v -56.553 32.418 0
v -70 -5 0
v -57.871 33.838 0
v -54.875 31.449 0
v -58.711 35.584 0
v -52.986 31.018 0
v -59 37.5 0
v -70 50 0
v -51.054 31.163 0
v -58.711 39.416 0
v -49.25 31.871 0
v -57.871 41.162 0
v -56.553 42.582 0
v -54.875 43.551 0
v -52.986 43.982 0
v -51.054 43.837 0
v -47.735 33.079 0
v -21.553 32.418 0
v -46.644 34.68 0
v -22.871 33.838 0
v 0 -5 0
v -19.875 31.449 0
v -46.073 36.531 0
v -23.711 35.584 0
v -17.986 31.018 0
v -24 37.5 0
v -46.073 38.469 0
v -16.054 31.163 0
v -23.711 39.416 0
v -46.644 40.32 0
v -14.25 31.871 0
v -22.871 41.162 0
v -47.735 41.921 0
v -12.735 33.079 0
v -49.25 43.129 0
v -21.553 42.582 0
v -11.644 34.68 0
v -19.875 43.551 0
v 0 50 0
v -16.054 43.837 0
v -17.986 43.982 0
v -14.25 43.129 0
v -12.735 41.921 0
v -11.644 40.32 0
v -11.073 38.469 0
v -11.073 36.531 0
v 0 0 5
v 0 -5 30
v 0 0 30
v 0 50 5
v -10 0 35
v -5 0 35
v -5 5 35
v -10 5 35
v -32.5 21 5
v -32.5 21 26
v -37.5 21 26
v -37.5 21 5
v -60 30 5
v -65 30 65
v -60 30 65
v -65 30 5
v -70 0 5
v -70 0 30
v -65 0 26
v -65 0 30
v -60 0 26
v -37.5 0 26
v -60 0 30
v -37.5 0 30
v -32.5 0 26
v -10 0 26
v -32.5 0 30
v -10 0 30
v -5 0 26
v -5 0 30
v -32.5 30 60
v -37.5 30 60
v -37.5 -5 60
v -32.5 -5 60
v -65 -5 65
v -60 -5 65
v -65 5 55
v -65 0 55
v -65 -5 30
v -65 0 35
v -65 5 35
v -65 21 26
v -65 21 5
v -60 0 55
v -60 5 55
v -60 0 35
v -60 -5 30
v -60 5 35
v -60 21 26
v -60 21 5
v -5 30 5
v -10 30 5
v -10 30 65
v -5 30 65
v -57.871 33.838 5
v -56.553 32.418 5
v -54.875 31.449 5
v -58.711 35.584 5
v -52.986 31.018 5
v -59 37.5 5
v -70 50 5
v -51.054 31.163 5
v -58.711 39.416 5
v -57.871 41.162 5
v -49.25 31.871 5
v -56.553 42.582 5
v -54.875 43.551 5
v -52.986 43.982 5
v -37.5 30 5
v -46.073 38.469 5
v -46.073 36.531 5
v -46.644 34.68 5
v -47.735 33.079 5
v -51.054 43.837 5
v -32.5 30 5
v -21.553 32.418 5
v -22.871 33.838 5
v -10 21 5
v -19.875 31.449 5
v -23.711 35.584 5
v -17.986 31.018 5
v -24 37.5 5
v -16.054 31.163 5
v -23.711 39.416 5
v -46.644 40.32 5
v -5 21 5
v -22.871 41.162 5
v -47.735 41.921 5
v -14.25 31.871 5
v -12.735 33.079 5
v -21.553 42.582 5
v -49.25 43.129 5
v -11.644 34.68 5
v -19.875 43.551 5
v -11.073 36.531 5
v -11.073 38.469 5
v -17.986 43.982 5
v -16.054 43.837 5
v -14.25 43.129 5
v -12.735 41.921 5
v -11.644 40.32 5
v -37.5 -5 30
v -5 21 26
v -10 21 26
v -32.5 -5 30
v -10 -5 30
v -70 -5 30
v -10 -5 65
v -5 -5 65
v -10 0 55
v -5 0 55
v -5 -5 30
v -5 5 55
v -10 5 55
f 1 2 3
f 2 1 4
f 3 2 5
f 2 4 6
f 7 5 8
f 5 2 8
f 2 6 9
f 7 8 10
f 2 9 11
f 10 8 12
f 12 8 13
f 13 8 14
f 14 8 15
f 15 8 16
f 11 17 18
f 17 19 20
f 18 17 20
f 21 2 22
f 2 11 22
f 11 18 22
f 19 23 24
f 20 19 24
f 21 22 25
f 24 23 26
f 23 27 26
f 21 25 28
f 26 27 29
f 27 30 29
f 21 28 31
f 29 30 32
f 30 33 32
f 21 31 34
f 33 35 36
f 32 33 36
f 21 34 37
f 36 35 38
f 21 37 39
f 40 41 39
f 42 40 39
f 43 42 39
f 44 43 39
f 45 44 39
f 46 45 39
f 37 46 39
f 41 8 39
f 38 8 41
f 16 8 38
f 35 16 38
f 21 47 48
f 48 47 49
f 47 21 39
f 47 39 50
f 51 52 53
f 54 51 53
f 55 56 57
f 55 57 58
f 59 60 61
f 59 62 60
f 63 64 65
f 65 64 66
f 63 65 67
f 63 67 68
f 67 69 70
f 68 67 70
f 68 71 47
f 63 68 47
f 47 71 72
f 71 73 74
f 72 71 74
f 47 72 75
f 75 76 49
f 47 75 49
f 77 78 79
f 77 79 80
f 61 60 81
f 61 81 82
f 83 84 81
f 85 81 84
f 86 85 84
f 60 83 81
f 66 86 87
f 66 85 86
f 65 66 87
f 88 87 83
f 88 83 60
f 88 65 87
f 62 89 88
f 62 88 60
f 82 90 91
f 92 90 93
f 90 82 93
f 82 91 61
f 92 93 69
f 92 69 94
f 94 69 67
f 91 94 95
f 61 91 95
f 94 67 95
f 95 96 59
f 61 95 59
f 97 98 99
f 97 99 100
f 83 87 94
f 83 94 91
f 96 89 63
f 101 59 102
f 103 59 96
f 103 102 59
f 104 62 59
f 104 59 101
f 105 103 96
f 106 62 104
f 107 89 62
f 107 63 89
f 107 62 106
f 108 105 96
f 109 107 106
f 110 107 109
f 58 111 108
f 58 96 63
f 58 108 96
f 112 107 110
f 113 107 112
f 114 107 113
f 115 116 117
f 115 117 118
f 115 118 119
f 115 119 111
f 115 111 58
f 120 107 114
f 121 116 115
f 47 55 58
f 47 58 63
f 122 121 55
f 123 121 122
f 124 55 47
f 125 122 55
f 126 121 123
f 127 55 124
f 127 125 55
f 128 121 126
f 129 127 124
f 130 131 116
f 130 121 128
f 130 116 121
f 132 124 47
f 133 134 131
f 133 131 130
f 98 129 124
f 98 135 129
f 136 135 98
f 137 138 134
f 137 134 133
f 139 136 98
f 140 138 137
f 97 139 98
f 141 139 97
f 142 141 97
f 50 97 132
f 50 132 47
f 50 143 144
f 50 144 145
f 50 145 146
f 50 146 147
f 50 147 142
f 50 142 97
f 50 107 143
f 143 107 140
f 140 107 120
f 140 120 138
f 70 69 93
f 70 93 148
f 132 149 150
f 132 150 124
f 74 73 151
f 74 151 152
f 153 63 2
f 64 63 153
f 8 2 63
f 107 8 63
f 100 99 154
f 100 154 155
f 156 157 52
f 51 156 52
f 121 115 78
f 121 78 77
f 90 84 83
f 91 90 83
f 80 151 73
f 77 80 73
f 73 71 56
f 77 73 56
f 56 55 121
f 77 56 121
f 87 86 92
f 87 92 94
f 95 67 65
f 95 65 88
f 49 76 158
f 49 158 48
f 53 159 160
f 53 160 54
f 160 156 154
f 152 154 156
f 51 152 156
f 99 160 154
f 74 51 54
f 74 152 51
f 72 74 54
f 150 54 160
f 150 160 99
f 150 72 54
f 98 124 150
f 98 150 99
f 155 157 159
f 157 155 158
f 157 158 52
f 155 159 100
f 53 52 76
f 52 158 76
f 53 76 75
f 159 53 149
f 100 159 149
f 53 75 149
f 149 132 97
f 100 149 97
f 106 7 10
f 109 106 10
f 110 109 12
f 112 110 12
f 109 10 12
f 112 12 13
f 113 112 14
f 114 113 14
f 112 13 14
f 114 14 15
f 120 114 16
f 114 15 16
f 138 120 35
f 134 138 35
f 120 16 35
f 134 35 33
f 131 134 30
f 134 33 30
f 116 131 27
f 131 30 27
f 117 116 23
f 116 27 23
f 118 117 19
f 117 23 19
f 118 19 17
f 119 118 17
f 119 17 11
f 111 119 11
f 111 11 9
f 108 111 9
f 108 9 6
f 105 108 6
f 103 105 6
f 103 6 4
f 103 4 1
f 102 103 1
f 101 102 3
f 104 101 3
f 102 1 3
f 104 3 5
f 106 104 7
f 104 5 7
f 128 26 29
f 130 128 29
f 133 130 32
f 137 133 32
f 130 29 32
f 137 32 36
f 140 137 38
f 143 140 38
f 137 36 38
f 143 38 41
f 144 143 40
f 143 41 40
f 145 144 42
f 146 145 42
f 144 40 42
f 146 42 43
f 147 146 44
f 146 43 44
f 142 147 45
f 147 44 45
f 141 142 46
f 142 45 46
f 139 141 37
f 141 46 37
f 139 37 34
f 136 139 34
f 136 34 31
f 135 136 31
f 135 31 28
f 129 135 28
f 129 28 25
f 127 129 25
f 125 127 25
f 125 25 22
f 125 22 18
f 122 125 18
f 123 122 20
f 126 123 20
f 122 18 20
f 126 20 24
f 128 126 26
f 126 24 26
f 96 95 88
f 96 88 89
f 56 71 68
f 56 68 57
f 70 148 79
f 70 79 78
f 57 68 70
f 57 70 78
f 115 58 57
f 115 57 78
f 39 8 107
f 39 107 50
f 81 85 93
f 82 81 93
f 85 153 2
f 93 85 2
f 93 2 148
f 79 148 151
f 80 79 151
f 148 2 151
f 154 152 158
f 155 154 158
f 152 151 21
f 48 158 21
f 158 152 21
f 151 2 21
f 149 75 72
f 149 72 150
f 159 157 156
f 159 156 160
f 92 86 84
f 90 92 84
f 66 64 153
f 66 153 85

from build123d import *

# Parameters (mm, degrees)
SKETCH1_W           = 70
SKETCH1_H           = 50
BOSS_EXTRUDE1_DEPTH = 5
SKETCH2_W           = 5
SKETCH2_H           = 30
BOSS_EXTRUDE2_DEPTH = 25
SKETCH3_W           = 21
SKETCH3_H           = 21
CUT_EXTRUDE1_DEPTH  = 5
SKETCH4_W           = 21
SKETCH4_H           = 21
CUT_EXTRUDE2_DEPTH  = 5
SKETCH5_W           = 21
SKETCH5_H           = 21
CUT_EXTRUDE3_DEPTH  = 5
SKETCH6_W           = 70
SKETCH6_H           = 30
BOSS_EXTRUDE3_DEPTH = 5
SKETCH7_W           = 5
SKETCH7_H           = 35
BOSS_EXTRUDE4_DEPTH = 35
SKETCH8_R           = 6.5
CUT_EXTRUDE4_DEPTH  = 5
SKETCH9_W           = 5
SKETCH9_H           = 35
CUT_EXTRUDE5_DEPTH  = 5
SKETCH10_W          = 20
SKETCH10_H          = 5
CUT_EXTRUDE6_DEPTH  = 5
SKETCH11_W          = 20
SKETCH11_H          = 5
CUT_EXTRUDE7_DEPTH  = 5


with BuildPart() as part:
    # Sketch1 → Boss-Extrude1 (new body)
    with BuildSketch(Plane.XY):
        with Locations((-35, 25)):
            Rectangle(SKETCH1_W, SKETCH1_H)
    extrude(amount=BOSS_EXTRUDE1_DEPTH)

    # Sketch2 → Boss-Extrude2 (add)
    with BuildSketch(Plane.XY.offset(5)):
        with Locations((-62.5, 15)):
            Rectangle(SKETCH2_W, SKETCH2_H)
        with Locations((-35, 15)):
            Rectangle(SKETCH2_W, SKETCH2_H)
        with Locations((-7.5, 15)):
            Rectangle(SKETCH2_W, SKETCH2_H)
    extrude(amount=BOSS_EXTRUDE2_DEPTH)

    # Sketch3 → Cut-Extrude1 (cut)
    with BuildSketch(Plane(origin=(-5, 0, 0), x_dir=(0, 0, -1), z_dir=(1, 0, 0))):
        with Locations((-15.5, 10.5)):
            Rectangle(SKETCH3_W, SKETCH3_H)
    extrude(amount=-CUT_EXTRUDE1_DEPTH, mode=Mode.SUBTRACT)

    # Sketch4 → Cut-Extrude2 (cut)
    with BuildSketch(Plane(origin=(-32.5, 0, 0), x_dir=(0, 0, -1), z_dir=(1, 0, 0))):
        with Locations((-15.5, 10.5)):
            Rectangle(SKETCH4_W, SKETCH4_H)
    extrude(amount=-CUT_EXTRUDE2_DEPTH, mode=Mode.SUBTRACT)

    # Sketch5 → Cut-Extrude3 (cut)
    with BuildSketch(Plane(origin=(-60, 0, 0), x_dir=(0, 0, -1), z_dir=(1, 0, 0))):
        with Locations((-15.5, 10.5)):
            Rectangle(SKETCH5_W, SKETCH5_H)
    extrude(amount=-CUT_EXTRUDE3_DEPTH, mode=Mode.SUBTRACT)

    # Sketch6 → Boss-Extrude3 (add)
    with BuildSketch(Plane.XZ):
        with Locations((-35, 15)):
            Rectangle(SKETCH6_W, SKETCH6_H)
    extrude(amount=BOSS_EXTRUDE3_DEPTH)

    # Sketch7 → Boss-Extrude4 (add)
    with BuildSketch(Plane.XY.offset(30)):
        with Locations((-35, 12.5)):
            Rectangle(SKETCH7_W, SKETCH7_H)
        with Locations((-7.5, 12.5)):
            Rectangle(SKETCH7_W, SKETCH7_H)
        with Locations((-62.5, 12.5)):
            Rectangle(SKETCH7_W, SKETCH7_H)
    extrude(amount=BOSS_EXTRUDE4_DEPTH)

    # Sketch8 → Cut-Extrude4 (cut)
    with BuildSketch(Plane(origin=(0, 0, 0), x_dir=(-1, 0, 0), z_dir=(0, 0, -1))):
        with Locations((17.5, 37.5)):
            Circle(SKETCH8_R)
        with Locations((52.5, 37.5)):
            Circle(SKETCH8_R)
    extrude(amount=-CUT_EXTRUDE4_DEPTH, mode=Mode.SUBTRACT)

    # Sketch9 → Cut-Extrude5 (cut)
    with BuildSketch(Plane.XY.offset(65)):
        with Locations((-35, 12.5)):
            Rectangle(SKETCH9_W, SKETCH9_H)
    extrude(amount=-CUT_EXTRUDE5_DEPTH, mode=Mode.SUBTRACT)

    # Sketch10 → Cut-Extrude6 (cut)
    with BuildSketch(Plane(origin=(-5, 0, 0), x_dir=(0, 0, -1), z_dir=(1, 0, 0))):
        with Locations((-45, 2.5)):
            Rectangle(SKETCH10_W, SKETCH10_H)
    extrude(amount=-CUT_EXTRUDE6_DEPTH, mode=Mode.SUBTRACT)

    # Sketch11 → Cut-Extrude7 (cut)
    with BuildSketch(Plane.ZY.offset(65)):
        with Locations((45, 2.5)):
            Rectangle(SKETCH11_W, SKETCH11_H)
    extrude(amount=-CUT_EXTRUDE7_DEPTH, mode=Mode.SUBTRACT)


solid = part.part
